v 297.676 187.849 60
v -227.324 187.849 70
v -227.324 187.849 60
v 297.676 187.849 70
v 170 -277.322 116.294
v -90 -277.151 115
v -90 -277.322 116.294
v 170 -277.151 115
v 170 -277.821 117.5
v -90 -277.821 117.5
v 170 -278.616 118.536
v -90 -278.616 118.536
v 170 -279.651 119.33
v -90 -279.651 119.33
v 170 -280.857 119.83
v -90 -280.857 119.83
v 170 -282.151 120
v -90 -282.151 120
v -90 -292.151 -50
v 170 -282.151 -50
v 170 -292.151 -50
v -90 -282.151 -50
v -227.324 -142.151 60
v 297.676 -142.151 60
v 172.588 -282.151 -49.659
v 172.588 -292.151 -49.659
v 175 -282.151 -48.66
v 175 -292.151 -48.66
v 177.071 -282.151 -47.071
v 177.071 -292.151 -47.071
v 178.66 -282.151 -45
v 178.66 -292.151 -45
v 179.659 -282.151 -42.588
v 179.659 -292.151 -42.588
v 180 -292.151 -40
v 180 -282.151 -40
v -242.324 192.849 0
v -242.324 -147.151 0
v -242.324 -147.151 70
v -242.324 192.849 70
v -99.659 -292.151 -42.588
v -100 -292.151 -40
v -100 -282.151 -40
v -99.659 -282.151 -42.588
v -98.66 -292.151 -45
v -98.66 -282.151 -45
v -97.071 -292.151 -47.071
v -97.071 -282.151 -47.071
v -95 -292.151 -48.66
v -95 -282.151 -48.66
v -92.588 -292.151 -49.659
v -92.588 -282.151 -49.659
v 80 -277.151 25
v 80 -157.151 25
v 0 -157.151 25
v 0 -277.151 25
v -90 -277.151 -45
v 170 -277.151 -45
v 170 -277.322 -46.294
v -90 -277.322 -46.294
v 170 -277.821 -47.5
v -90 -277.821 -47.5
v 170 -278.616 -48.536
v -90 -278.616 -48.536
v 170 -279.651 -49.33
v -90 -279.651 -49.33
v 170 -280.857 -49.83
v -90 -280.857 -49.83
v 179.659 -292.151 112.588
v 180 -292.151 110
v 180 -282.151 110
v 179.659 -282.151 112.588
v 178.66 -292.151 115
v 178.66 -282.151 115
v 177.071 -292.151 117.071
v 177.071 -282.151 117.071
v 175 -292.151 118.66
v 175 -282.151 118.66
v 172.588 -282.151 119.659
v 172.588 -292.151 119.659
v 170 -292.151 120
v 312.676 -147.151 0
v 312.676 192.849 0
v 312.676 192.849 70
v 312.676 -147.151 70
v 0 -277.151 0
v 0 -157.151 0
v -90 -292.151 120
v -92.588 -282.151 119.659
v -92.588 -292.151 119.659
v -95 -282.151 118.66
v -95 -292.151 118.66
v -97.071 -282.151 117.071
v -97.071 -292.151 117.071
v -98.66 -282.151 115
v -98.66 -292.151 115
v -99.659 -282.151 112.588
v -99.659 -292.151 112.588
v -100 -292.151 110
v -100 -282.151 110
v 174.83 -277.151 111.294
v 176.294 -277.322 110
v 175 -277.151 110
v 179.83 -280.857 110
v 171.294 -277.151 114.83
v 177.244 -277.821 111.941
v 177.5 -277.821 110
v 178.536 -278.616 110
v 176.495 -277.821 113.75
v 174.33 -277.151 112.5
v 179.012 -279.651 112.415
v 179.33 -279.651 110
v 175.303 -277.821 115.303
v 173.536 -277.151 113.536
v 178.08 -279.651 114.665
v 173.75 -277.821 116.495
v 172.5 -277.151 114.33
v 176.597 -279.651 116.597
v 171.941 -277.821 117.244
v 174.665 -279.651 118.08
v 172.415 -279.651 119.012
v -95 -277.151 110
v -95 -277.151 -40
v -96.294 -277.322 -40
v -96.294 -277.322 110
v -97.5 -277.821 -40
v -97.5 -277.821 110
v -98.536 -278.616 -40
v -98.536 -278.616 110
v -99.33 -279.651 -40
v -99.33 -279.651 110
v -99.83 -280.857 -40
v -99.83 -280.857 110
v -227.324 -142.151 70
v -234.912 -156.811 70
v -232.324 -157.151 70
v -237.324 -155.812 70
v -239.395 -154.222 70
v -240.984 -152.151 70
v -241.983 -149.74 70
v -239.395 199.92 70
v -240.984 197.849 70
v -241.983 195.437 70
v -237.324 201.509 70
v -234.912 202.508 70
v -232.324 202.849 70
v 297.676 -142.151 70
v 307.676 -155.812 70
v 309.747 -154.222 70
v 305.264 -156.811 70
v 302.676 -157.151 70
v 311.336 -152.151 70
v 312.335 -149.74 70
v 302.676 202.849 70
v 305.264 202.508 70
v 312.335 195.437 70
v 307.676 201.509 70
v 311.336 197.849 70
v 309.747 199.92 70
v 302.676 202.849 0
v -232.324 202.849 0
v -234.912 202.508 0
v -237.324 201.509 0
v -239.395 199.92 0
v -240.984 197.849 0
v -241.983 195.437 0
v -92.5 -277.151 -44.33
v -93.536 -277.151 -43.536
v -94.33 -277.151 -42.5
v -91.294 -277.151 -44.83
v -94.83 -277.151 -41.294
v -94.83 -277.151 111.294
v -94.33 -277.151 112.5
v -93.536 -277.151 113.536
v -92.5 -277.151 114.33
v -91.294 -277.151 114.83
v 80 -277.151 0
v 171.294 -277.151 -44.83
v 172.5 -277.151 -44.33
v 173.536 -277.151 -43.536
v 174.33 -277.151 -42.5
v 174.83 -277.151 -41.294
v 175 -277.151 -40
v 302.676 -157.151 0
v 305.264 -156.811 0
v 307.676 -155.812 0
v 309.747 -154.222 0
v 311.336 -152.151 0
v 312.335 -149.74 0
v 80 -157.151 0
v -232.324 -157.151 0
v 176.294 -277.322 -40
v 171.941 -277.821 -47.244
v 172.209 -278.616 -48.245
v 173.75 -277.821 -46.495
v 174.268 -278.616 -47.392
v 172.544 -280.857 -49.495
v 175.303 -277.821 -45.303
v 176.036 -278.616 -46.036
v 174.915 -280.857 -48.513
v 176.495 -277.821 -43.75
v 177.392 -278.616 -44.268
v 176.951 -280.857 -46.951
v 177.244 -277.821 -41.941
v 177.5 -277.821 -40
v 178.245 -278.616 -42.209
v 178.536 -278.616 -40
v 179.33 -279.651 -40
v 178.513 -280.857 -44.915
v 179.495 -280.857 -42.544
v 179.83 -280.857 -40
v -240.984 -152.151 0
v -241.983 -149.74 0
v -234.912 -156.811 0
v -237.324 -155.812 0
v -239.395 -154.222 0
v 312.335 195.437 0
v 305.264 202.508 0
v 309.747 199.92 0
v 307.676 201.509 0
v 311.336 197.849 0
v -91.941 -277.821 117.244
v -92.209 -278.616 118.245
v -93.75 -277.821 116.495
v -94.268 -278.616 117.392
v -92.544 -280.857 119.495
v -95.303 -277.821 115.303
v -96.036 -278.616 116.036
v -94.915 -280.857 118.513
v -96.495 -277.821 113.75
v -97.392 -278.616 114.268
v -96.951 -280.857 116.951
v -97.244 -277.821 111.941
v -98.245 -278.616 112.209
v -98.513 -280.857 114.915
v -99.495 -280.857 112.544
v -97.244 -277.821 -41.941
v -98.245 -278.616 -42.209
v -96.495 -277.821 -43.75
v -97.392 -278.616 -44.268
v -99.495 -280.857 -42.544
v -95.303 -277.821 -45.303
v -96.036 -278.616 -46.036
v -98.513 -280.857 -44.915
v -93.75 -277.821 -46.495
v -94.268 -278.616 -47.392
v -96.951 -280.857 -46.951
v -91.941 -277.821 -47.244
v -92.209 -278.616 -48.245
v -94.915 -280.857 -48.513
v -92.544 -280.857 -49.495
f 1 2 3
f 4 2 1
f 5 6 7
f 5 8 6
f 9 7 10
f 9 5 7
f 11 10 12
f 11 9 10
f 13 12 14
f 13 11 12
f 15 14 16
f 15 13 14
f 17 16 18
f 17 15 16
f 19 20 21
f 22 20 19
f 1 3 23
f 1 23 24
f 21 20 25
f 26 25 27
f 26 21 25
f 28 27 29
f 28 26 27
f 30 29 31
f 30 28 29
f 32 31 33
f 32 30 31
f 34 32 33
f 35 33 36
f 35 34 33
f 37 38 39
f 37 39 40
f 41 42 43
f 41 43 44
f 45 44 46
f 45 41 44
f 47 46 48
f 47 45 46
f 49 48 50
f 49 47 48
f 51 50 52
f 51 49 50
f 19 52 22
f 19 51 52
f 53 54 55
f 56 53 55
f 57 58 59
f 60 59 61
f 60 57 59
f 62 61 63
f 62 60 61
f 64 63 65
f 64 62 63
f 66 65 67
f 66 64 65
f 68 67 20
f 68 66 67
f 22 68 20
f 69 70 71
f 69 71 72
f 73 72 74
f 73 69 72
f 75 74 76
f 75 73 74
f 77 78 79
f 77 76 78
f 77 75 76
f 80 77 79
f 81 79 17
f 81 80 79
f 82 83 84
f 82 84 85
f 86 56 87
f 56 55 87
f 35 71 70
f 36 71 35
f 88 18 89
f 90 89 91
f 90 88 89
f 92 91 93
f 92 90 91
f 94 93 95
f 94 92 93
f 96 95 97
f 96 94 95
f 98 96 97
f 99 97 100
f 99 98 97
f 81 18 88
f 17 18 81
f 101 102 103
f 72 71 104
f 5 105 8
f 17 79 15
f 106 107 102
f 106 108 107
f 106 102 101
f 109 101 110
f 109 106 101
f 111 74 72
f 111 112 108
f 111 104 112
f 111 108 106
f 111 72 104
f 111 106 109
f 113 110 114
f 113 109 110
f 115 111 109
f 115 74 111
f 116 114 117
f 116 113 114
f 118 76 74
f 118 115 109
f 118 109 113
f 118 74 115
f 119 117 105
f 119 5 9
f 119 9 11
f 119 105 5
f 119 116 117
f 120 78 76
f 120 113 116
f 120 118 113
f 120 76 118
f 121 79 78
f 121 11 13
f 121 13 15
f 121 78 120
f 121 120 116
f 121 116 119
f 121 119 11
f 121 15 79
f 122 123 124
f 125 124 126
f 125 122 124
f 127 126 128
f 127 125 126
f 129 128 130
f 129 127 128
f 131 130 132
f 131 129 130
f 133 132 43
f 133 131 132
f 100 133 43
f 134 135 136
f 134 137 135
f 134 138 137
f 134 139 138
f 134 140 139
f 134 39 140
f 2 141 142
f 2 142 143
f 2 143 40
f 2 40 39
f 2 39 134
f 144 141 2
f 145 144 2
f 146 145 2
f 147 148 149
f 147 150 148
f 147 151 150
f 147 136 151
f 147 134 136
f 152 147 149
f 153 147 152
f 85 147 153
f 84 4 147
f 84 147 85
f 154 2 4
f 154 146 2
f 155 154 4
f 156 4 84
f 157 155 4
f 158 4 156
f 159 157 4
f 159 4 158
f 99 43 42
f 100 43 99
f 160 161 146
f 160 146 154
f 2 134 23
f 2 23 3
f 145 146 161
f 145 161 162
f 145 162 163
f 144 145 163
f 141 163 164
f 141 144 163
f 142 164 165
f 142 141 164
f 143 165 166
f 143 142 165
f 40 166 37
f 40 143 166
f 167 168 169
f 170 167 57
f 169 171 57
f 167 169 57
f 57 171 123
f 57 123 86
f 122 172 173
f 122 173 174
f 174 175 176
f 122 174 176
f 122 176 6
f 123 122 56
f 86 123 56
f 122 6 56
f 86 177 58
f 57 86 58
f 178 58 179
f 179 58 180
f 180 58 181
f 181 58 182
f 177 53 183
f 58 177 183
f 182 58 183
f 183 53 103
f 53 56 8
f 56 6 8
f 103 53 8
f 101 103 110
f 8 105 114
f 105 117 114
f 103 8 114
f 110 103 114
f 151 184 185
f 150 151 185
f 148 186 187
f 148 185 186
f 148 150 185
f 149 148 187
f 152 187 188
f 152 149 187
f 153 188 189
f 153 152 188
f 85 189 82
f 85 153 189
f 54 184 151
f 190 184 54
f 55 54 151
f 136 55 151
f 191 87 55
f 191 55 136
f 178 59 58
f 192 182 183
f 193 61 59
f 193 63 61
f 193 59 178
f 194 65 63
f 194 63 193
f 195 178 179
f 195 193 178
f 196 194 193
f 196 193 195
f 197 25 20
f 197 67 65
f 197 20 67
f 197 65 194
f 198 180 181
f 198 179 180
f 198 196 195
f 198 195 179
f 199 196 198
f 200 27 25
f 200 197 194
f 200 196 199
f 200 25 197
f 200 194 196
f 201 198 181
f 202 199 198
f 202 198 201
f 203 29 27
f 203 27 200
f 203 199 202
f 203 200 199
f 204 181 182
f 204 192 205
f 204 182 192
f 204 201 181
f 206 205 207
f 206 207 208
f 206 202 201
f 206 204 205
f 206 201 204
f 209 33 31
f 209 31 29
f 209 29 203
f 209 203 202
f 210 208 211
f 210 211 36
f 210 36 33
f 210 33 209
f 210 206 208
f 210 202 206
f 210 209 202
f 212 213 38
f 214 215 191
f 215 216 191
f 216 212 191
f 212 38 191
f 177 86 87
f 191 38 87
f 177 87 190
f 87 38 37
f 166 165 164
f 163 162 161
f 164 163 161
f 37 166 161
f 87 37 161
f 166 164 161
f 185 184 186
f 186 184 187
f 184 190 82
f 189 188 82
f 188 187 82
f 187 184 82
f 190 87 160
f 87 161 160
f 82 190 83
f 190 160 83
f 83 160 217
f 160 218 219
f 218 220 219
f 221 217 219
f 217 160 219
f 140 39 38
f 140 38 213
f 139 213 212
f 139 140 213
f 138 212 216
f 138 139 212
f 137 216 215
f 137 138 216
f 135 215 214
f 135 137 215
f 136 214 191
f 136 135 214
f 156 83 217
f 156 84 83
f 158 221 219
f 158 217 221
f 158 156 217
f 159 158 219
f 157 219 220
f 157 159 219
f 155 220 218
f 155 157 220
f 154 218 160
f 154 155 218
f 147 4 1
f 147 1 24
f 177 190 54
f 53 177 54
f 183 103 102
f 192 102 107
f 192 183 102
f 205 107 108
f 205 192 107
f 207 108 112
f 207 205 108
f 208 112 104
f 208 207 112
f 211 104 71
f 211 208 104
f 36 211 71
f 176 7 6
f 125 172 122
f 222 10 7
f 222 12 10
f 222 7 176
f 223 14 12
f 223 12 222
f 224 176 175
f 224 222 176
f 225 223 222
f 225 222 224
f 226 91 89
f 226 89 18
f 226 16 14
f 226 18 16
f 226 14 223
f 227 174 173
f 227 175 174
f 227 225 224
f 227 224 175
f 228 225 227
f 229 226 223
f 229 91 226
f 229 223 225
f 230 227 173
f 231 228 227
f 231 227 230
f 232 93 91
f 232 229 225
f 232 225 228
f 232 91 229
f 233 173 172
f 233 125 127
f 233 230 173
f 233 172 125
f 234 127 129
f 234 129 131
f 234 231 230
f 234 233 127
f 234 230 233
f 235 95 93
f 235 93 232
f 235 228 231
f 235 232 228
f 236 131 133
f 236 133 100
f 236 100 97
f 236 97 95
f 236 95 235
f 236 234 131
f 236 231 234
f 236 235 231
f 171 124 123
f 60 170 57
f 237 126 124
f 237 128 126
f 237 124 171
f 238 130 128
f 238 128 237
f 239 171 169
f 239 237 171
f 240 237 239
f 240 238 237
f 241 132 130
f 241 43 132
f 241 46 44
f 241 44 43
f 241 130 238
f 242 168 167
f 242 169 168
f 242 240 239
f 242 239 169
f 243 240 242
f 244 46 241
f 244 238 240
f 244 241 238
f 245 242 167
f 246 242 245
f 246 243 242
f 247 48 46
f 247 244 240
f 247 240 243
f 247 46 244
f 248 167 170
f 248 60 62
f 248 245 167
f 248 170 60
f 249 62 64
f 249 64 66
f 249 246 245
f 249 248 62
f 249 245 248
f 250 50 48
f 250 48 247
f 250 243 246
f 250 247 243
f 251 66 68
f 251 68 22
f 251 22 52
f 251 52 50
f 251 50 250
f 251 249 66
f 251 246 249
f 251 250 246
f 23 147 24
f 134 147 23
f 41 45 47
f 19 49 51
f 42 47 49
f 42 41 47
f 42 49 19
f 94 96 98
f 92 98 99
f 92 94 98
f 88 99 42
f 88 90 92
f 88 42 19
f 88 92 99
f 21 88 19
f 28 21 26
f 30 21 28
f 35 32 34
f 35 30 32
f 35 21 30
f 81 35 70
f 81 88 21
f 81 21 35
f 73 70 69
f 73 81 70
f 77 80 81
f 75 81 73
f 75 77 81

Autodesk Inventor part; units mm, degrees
ref_plane "YZ Plane" through (0, 0, 0) normal (1, 0, 0) x (0, 1, 0)
ref_plane "XZ Plane" through (0, 0, 0) normal (0, 1, 0) x (-1, 0, 0)
ref_plane "XY Plane" through (0, 0, 0) normal (0, 0, 1) x (1, 0, 0)
sketch "Esquisse1" plane through (0, 0, 0) normal (0, 0, 1) x (1, 0, 0)
  line L0 (-242.3239, 202.8486) -> (312.6761, 202.8486)
  line L1 (312.6761, 202.8486) -> (312.6761, -157.1514)
  line L2 (312.6761, -157.1514) -> (-242.3239, -157.1514)
  line L3 (-242.3239, -157.1514) -> (-242.3239, 202.8486)
  point P0 (0, 0)
  dimension "d0" = 555
  dimension "d1" = 360
extrude "Extrusion1" add sketch "Esquisse1" along normal blind 70
fillet "Congé1" radius 10 4 edges at (-242.3239, 202.8486, 35) (-242.3239, -157.1514, 35) (312.6761, -157.1514, 35) (312.6761, 202.8486, 35)
sketch "Esquisse2" plane through (0, 0, 70) normal (0, 0, 1) x (1, 0, 0)
  line L0 (-227.3239, 187.8486) -> (297.6761, 187.8486)
  line L1 (297.6761, 187.8486) -> (297.6761, -142.1514)
  line L2 (297.6761, -142.1514) -> (-227.3239, -142.1514)
  line L3 (-227.3239, -142.1514) -> (-227.3239, 187.8486)
  line L4 (302.6761, 202.8486) -> (-232.3239, 202.8486) projected
  line L5 (-232.3239, -157.1514) -> (302.6761, -157.1514) projected
  line L6 (-242.3239, 192.8486) -> (-242.3239, -147.1514) projected
  line L7 (312.6761, -147.1514) -> (312.6761, 192.8486) projected
  point P0 (0, 0)
  dimension "d5" = 15
  dimension "d6" = 15
  dimension "d7" = 15
  dimension "d8" = 15
extrude "Extrusion2" cut sketch "Esquisse2" against normal blind 10
sketch "Esquisse3" plane through (-232.3239, -157.1514, 0) normal (0, -1, 0) x (1, 0, 0)
  line L0 (232.3239, 0) -> (312.3239, 0)
  line L1 (312.3239, 0) -> (312.3239, 25)
  line L2 (312.3239, 25) -> (232.3239, 25)
  line L3 (232.3239, 25) -> (232.3239, 0)
  dimension "d11" = 80
  dimension "d12" = 25
extrude "Extrusion3" add sketch "Esquisse3" along normal blind 120
sketch "Esquisse4" plane through (-232.3239, -277.1514, 0) normal (0, -1, 0) x (1, 0, 0)
  line L0 (132.3239, 120) -> (412.3239, 120)
  line L1 (412.3239, 120) -> (412.3239, -50)
  line L2 (412.3239, -50) -> (132.3239, -50)
  line L3 (132.3239, -50) -> (132.3239, 120)
  line L4 (232.3239, 25) -> (232.3239, 0) projected
  dimension "d15" = 170
  dimension "d16" = 280
  dimension "d17" = 50
  dimension "d18" = 100
extrude "Extrusion4" add sketch "Esquisse4" along normal blind 15
fillet "Congé2" radius 10 4 edges at (180, -284.6514, 120) (-100, -284.6514, 120) (180, -284.6514, -50) (-100, -284.6514, -50)
fillet "Congé3" radius 5 8 edges at (177.0711, -277.1514, 117.0711) (180, -277.1514, 35) (177.0711, -277.1514, -47.0711) (40, -277.1514, -50) (-97.0711, -277.1514, -47.0711) (-100, -277.1514, 35) (-97.0711, -277.1514, 117.0711) (40, -277.1514, 120)
equation "\"d6\" = d5"
equation "\"d7\" = d5"
equation "\"d8\" = d5"
properties part number "Ecran"
